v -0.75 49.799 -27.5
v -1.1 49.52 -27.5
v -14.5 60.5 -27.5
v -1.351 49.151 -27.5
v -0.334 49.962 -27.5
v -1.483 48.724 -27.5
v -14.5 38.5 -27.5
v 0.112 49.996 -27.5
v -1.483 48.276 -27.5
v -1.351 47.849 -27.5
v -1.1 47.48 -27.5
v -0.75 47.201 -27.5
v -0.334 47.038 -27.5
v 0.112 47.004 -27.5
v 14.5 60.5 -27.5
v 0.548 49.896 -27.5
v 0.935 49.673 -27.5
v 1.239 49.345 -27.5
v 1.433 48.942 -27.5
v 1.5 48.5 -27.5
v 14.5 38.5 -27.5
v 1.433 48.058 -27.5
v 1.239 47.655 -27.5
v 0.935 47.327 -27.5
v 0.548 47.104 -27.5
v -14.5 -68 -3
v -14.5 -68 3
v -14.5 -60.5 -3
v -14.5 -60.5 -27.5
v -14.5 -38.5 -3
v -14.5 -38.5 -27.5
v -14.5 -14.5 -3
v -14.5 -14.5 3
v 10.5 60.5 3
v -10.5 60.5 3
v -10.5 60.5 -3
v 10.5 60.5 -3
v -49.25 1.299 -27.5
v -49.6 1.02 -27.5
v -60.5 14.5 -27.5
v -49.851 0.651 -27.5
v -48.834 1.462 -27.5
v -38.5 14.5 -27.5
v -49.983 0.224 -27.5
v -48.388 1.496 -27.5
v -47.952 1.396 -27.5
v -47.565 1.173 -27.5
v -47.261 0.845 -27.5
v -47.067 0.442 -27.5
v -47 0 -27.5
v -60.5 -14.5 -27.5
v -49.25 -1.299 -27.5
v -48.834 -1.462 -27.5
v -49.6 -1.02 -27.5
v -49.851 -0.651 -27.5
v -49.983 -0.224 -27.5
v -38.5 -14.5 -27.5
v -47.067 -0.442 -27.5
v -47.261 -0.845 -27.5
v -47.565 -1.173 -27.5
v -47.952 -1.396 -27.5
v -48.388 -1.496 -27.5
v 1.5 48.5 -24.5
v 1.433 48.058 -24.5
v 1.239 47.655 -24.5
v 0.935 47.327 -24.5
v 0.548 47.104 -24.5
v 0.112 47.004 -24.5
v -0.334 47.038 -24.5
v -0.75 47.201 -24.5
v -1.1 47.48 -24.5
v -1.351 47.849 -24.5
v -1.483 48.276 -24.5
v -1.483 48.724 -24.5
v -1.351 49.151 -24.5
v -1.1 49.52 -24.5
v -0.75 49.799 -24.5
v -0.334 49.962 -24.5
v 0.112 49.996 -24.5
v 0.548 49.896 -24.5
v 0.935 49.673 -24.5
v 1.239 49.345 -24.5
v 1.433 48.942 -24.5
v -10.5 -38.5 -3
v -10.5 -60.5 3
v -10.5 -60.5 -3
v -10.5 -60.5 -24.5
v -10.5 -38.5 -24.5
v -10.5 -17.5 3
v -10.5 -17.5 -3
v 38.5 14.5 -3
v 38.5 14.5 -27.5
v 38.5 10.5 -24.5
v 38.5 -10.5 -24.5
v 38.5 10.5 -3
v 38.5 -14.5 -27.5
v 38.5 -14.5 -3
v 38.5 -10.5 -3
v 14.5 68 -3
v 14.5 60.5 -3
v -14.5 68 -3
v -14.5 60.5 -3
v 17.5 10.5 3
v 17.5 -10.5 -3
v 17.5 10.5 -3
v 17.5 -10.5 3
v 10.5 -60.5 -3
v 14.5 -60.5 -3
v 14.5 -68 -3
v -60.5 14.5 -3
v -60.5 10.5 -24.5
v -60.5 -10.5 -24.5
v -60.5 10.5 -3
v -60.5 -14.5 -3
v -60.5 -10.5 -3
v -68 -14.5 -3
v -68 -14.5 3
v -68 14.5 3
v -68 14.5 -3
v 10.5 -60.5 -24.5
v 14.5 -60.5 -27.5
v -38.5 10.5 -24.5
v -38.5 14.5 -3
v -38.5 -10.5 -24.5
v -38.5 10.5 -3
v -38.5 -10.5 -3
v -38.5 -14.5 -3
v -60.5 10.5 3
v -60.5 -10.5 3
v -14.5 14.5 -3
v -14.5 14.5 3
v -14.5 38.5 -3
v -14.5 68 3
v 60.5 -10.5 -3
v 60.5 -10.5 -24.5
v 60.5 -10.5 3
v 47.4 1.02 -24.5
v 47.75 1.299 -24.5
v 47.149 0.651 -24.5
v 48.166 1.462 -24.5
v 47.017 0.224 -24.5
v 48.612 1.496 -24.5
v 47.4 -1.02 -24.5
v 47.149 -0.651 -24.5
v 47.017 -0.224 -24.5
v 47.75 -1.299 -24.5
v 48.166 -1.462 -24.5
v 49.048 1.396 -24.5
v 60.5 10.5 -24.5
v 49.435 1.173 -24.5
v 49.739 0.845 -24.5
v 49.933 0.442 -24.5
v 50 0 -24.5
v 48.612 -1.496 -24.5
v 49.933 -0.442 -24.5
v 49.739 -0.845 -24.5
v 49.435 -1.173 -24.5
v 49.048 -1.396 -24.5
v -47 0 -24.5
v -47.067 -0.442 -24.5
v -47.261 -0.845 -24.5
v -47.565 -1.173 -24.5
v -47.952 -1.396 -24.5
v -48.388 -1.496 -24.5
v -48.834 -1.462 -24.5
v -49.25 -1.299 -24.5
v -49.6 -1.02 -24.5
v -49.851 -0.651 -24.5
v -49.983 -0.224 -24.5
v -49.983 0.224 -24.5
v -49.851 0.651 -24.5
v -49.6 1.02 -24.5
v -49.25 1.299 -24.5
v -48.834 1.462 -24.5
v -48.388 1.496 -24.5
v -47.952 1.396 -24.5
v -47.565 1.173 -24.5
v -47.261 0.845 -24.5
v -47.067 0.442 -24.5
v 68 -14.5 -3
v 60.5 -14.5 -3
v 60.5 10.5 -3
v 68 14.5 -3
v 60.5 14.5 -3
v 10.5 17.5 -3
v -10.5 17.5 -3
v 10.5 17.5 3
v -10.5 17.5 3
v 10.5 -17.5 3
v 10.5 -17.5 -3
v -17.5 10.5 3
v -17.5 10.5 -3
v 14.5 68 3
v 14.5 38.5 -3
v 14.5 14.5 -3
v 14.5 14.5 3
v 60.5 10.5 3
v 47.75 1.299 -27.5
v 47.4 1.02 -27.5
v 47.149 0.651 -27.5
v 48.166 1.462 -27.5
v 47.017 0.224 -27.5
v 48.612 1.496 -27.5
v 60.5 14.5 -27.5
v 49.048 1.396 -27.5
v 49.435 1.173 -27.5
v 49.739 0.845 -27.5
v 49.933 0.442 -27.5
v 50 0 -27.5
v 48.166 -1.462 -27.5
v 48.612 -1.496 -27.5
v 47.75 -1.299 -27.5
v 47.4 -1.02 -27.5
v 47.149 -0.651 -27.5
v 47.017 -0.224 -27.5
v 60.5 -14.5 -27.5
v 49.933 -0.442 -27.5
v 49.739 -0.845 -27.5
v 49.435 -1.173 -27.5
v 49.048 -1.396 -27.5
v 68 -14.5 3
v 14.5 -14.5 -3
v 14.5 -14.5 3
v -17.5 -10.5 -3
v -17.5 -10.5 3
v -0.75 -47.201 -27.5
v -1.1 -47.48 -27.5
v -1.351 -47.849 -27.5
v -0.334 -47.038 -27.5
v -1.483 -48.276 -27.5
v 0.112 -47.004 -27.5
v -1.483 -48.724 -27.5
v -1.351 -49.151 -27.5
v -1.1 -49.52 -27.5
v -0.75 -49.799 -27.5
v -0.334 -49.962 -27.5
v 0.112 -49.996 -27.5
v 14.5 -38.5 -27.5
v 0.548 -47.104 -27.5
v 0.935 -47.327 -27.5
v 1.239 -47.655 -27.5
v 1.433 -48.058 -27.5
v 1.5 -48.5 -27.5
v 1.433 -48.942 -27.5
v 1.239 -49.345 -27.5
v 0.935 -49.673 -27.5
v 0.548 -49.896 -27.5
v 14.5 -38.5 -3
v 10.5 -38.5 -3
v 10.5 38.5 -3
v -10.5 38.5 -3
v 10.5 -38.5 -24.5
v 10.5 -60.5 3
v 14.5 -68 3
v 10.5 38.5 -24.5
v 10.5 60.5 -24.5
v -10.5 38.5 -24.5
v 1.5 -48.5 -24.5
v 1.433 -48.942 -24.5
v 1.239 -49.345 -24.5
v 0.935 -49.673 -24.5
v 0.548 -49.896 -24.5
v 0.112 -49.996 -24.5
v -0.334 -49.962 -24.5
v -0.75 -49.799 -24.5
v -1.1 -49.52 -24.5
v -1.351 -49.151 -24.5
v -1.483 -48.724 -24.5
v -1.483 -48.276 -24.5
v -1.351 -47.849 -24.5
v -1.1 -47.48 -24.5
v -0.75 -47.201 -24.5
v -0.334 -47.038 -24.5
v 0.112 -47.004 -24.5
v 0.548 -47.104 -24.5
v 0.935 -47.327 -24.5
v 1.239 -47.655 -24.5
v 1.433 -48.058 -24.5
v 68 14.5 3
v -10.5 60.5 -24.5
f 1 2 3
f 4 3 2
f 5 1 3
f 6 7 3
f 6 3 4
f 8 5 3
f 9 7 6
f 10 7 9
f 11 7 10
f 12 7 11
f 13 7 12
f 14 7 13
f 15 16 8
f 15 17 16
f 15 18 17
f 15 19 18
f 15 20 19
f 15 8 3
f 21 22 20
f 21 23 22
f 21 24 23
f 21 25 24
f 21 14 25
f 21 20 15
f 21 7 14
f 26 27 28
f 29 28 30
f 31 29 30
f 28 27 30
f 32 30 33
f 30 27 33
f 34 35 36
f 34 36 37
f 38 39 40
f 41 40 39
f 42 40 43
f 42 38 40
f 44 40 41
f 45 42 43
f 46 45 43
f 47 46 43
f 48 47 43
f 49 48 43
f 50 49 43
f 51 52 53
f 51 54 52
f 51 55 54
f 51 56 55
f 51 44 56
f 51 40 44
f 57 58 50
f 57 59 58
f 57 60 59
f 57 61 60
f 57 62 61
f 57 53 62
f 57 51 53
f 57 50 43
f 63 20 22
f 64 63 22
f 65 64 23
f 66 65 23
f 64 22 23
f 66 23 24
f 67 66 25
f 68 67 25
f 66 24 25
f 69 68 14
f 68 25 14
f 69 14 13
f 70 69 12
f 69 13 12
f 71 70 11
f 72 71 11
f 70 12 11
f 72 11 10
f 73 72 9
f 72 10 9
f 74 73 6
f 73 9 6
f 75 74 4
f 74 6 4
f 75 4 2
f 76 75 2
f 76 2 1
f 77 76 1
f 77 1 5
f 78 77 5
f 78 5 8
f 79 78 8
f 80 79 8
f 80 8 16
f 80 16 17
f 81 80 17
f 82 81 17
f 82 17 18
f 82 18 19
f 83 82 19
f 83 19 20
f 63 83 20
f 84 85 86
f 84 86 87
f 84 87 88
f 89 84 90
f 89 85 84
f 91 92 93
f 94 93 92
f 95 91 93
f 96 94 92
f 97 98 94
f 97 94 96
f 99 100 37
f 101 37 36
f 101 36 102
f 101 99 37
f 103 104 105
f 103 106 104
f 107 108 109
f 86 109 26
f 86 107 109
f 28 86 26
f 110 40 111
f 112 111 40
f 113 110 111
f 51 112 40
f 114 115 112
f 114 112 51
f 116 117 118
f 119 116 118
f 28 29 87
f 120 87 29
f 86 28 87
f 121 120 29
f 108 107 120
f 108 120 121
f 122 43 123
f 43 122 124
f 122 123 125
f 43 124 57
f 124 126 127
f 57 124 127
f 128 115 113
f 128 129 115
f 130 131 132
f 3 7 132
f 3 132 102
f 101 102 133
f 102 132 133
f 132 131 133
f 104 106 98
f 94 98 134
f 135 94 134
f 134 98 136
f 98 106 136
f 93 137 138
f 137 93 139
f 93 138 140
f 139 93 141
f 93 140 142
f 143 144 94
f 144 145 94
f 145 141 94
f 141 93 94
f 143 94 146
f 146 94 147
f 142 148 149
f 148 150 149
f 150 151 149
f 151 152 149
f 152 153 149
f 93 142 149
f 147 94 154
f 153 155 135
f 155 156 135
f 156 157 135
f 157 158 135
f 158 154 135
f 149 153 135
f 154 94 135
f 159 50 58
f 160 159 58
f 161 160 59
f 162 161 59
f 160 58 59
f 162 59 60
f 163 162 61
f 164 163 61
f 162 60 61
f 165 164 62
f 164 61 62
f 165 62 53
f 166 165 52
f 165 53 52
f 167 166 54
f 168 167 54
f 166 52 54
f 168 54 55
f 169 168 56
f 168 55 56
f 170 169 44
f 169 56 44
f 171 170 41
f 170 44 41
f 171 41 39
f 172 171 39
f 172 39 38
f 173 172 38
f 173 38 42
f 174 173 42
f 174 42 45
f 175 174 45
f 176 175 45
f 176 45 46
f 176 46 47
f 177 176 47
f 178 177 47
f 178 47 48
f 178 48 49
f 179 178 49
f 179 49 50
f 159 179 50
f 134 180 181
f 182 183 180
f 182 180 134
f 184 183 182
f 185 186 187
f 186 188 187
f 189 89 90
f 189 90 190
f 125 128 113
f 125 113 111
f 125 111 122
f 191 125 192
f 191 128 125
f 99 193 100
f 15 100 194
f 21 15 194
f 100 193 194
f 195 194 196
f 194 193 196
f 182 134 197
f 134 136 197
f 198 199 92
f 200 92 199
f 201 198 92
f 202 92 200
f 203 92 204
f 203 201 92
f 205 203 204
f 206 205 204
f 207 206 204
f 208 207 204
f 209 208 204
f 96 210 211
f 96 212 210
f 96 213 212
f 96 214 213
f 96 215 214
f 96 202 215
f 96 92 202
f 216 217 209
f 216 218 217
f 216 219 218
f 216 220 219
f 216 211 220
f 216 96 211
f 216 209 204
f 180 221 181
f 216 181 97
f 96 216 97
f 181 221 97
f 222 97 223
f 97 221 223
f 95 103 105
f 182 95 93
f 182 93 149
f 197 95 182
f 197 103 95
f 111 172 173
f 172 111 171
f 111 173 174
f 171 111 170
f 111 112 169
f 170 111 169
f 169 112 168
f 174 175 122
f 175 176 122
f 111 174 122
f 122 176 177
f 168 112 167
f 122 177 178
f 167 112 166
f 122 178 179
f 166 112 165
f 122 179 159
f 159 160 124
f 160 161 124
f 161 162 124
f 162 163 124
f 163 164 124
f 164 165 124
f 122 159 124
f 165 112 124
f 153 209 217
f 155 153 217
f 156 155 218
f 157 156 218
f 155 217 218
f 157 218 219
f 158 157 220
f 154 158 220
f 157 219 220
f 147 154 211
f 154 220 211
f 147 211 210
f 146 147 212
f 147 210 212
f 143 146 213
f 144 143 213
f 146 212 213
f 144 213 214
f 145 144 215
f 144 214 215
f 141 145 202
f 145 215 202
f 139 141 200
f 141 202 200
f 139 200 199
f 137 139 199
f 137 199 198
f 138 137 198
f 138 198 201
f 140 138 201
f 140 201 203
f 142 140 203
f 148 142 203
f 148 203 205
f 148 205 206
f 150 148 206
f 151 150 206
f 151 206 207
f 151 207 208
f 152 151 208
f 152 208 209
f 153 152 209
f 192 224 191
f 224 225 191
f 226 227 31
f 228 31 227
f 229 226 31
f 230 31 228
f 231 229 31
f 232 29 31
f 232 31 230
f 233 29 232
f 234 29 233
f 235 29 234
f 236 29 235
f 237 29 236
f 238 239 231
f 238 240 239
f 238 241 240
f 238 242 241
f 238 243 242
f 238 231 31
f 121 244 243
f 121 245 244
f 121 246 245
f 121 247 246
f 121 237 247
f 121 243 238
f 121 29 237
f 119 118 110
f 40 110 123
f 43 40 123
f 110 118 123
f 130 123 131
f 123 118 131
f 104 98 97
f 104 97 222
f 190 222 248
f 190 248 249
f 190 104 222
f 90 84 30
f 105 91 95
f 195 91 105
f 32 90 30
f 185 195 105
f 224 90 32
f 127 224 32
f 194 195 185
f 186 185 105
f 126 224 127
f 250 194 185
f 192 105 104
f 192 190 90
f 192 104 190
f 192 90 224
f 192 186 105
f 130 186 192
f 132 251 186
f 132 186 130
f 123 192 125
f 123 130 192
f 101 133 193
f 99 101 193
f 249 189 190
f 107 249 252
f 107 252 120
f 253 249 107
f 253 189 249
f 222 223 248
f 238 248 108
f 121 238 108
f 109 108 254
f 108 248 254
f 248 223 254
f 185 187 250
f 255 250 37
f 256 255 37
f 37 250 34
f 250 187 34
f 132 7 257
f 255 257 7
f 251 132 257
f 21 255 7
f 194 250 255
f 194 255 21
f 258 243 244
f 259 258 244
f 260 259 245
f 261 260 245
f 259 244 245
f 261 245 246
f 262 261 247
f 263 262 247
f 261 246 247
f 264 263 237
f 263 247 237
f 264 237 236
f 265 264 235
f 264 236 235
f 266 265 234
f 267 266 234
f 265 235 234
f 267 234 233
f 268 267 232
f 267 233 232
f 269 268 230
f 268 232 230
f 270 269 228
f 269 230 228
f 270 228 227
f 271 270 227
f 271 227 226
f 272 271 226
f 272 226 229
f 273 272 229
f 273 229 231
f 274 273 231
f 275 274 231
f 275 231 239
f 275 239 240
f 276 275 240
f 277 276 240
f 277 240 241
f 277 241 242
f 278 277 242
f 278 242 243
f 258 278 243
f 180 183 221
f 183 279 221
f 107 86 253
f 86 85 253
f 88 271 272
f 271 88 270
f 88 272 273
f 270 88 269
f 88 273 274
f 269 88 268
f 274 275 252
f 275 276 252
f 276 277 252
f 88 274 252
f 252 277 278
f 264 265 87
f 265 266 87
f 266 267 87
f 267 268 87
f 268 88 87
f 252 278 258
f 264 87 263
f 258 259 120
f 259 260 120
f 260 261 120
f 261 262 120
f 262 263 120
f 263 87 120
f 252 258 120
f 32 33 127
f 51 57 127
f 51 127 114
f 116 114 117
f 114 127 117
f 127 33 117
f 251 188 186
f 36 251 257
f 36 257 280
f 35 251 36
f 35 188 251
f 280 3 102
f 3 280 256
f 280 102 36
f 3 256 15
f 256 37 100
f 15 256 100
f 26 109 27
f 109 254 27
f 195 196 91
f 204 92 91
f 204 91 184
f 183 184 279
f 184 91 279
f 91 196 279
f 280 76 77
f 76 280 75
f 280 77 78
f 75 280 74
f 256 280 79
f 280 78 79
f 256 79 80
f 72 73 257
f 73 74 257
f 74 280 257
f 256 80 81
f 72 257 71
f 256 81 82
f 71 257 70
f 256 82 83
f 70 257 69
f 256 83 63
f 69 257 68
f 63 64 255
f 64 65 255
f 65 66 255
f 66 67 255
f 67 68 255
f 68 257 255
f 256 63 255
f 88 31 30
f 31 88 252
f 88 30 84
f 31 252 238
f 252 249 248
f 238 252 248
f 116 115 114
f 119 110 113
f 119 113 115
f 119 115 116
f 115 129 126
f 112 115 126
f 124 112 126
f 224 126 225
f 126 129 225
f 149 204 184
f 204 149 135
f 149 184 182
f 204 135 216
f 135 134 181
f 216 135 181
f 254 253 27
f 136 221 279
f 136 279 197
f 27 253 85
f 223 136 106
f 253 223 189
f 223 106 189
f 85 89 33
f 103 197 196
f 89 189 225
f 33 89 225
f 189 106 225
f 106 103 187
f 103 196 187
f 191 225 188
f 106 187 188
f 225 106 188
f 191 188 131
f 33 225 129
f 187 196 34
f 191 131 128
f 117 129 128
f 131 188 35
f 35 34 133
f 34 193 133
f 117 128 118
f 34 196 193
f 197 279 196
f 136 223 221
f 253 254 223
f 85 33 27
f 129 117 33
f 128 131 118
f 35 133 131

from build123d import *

# Parameters (mm, degrees)
SKETCH_W        = 43
SKETCH_H        = 21
SKETCH_W_2      = 21
SKETCH_H_2      = 43
PAD_DEPTH       = 3
SKETCH001_W     = 4
SKETCH001_H     = 22
SKETCH001_W_2   = 22
SKETCH001_H_2   = 4
PAD001002_DEPTH = 24.5
SKETCH002_W     = 22
SKETCH002_H     = 29
SKETCH002_W_2   = 29
SKETCH002_H_2   = 22
PAD001003_DEPTH = 3
SKETCH003_R     = 1.5
POCKET_DEPTH    = 5


with BuildPart() as part:
    # Sketch → Pad (new body, symmetric)
    with BuildSketch(Plane.XY):
        Polygon((-14.5, 68), (14.5, 68), (14.5, 14.5), (68, 14.5), (68, -14.5), (14.5, -14.5), (14.5, -68), (-14.5, -68), (-14.5, -14.5), (-68, -14.5), (-68, 14.5), (-14.5, 14.5), align=None)
        with Locations((39, 0)):
            Rectangle(SKETCH_W, SKETCH_H, mode=Mode.SUBTRACT)
        with Locations((0, 39)):
            Rectangle(SKETCH_W_2, SKETCH_H_2, mode=Mode.SUBTRACT)
        with Locations((-39, 0)):
            Rectangle(SKETCH_W, SKETCH_H, mode=Mode.SUBTRACT)
        with Locations((0, -39)):
            Rectangle(SKETCH_W_2, SKETCH_H_2, mode=Mode.SUBTRACT)
    extrude(amount=PAD_DEPTH, both=True)

    # Sketch001 → Pad001002 (new body)
    with BuildSketch(Plane(origin=(0, 0, -3), x_dir=(1, 0, 0), z_dir=(0, 0, -1))):
        with Locations((12.5, 49.5)):
            Rectangle(SKETCH001_W, SKETCH001_H)
        with Locations((-12.5, 49.5)):
            Rectangle(SKETCH001_W, SKETCH001_H)
        with Locations((-12.5, -49.5)):
            Rectangle(SKETCH001_W, SKETCH001_H)
        with Locations((12.5, -49.5)):
            Rectangle(SKETCH001_W, SKETCH001_H)
        with Locations((-49.5, 12.5)):
            Rectangle(SKETCH001_W_2, SKETCH001_H_2)
        with Locations((-49.5, -12.5)):
            Rectangle(SKETCH001_W_2, SKETCH001_H_2)
        with Locations((49.5, -12.5)):
            Rectangle(SKETCH001_W_2, SKETCH001_H_2)
        with Locations((49.5, 12.5)):
            Rectangle(SKETCH001_W_2, SKETCH001_H_2)
    extrude(amount=PAD001002_DEPTH)

    # Sketch002 → Pad001003 (new body)
    with BuildSketch(Plane(origin=(0, 0, -27.5), x_dir=(1, 0, 0), z_dir=(0, 0, -1))):
        with Locations((-49.5, 0)):
            Rectangle(SKETCH002_W, SKETCH002_H)
        with Locations((0, 49.5)):
            Rectangle(SKETCH002_W_2, SKETCH002_H_2)
        with Locations((49.5, 0)):
            Rectangle(SKETCH002_W, SKETCH002_H)
        with Locations((0, -49.5)):
            Rectangle(SKETCH002_W_2, SKETCH002_H_2)
    extrude(amount=-PAD001003_DEPTH)

    # Sketch003 → Pocket (cut)
    with BuildSketch(Plane(origin=(0, 0, -27.5), x_dir=(1, 0, 0), z_dir=(0, 0, -1))):
        with Locations((0, -48.5)):
            Circle(SKETCH003_R)
        with Locations((-48.5, 0)):
            Circle(SKETCH003_R)
        with Locations((0, 48.5)):
            Circle(SKETCH003_R)
        with Locations((48.5, 0)):
            Circle(SKETCH003_R)
    extrude(amount=-POCKET_DEPTH, mode=Mode.SUBTRACT)


solid = part.part
